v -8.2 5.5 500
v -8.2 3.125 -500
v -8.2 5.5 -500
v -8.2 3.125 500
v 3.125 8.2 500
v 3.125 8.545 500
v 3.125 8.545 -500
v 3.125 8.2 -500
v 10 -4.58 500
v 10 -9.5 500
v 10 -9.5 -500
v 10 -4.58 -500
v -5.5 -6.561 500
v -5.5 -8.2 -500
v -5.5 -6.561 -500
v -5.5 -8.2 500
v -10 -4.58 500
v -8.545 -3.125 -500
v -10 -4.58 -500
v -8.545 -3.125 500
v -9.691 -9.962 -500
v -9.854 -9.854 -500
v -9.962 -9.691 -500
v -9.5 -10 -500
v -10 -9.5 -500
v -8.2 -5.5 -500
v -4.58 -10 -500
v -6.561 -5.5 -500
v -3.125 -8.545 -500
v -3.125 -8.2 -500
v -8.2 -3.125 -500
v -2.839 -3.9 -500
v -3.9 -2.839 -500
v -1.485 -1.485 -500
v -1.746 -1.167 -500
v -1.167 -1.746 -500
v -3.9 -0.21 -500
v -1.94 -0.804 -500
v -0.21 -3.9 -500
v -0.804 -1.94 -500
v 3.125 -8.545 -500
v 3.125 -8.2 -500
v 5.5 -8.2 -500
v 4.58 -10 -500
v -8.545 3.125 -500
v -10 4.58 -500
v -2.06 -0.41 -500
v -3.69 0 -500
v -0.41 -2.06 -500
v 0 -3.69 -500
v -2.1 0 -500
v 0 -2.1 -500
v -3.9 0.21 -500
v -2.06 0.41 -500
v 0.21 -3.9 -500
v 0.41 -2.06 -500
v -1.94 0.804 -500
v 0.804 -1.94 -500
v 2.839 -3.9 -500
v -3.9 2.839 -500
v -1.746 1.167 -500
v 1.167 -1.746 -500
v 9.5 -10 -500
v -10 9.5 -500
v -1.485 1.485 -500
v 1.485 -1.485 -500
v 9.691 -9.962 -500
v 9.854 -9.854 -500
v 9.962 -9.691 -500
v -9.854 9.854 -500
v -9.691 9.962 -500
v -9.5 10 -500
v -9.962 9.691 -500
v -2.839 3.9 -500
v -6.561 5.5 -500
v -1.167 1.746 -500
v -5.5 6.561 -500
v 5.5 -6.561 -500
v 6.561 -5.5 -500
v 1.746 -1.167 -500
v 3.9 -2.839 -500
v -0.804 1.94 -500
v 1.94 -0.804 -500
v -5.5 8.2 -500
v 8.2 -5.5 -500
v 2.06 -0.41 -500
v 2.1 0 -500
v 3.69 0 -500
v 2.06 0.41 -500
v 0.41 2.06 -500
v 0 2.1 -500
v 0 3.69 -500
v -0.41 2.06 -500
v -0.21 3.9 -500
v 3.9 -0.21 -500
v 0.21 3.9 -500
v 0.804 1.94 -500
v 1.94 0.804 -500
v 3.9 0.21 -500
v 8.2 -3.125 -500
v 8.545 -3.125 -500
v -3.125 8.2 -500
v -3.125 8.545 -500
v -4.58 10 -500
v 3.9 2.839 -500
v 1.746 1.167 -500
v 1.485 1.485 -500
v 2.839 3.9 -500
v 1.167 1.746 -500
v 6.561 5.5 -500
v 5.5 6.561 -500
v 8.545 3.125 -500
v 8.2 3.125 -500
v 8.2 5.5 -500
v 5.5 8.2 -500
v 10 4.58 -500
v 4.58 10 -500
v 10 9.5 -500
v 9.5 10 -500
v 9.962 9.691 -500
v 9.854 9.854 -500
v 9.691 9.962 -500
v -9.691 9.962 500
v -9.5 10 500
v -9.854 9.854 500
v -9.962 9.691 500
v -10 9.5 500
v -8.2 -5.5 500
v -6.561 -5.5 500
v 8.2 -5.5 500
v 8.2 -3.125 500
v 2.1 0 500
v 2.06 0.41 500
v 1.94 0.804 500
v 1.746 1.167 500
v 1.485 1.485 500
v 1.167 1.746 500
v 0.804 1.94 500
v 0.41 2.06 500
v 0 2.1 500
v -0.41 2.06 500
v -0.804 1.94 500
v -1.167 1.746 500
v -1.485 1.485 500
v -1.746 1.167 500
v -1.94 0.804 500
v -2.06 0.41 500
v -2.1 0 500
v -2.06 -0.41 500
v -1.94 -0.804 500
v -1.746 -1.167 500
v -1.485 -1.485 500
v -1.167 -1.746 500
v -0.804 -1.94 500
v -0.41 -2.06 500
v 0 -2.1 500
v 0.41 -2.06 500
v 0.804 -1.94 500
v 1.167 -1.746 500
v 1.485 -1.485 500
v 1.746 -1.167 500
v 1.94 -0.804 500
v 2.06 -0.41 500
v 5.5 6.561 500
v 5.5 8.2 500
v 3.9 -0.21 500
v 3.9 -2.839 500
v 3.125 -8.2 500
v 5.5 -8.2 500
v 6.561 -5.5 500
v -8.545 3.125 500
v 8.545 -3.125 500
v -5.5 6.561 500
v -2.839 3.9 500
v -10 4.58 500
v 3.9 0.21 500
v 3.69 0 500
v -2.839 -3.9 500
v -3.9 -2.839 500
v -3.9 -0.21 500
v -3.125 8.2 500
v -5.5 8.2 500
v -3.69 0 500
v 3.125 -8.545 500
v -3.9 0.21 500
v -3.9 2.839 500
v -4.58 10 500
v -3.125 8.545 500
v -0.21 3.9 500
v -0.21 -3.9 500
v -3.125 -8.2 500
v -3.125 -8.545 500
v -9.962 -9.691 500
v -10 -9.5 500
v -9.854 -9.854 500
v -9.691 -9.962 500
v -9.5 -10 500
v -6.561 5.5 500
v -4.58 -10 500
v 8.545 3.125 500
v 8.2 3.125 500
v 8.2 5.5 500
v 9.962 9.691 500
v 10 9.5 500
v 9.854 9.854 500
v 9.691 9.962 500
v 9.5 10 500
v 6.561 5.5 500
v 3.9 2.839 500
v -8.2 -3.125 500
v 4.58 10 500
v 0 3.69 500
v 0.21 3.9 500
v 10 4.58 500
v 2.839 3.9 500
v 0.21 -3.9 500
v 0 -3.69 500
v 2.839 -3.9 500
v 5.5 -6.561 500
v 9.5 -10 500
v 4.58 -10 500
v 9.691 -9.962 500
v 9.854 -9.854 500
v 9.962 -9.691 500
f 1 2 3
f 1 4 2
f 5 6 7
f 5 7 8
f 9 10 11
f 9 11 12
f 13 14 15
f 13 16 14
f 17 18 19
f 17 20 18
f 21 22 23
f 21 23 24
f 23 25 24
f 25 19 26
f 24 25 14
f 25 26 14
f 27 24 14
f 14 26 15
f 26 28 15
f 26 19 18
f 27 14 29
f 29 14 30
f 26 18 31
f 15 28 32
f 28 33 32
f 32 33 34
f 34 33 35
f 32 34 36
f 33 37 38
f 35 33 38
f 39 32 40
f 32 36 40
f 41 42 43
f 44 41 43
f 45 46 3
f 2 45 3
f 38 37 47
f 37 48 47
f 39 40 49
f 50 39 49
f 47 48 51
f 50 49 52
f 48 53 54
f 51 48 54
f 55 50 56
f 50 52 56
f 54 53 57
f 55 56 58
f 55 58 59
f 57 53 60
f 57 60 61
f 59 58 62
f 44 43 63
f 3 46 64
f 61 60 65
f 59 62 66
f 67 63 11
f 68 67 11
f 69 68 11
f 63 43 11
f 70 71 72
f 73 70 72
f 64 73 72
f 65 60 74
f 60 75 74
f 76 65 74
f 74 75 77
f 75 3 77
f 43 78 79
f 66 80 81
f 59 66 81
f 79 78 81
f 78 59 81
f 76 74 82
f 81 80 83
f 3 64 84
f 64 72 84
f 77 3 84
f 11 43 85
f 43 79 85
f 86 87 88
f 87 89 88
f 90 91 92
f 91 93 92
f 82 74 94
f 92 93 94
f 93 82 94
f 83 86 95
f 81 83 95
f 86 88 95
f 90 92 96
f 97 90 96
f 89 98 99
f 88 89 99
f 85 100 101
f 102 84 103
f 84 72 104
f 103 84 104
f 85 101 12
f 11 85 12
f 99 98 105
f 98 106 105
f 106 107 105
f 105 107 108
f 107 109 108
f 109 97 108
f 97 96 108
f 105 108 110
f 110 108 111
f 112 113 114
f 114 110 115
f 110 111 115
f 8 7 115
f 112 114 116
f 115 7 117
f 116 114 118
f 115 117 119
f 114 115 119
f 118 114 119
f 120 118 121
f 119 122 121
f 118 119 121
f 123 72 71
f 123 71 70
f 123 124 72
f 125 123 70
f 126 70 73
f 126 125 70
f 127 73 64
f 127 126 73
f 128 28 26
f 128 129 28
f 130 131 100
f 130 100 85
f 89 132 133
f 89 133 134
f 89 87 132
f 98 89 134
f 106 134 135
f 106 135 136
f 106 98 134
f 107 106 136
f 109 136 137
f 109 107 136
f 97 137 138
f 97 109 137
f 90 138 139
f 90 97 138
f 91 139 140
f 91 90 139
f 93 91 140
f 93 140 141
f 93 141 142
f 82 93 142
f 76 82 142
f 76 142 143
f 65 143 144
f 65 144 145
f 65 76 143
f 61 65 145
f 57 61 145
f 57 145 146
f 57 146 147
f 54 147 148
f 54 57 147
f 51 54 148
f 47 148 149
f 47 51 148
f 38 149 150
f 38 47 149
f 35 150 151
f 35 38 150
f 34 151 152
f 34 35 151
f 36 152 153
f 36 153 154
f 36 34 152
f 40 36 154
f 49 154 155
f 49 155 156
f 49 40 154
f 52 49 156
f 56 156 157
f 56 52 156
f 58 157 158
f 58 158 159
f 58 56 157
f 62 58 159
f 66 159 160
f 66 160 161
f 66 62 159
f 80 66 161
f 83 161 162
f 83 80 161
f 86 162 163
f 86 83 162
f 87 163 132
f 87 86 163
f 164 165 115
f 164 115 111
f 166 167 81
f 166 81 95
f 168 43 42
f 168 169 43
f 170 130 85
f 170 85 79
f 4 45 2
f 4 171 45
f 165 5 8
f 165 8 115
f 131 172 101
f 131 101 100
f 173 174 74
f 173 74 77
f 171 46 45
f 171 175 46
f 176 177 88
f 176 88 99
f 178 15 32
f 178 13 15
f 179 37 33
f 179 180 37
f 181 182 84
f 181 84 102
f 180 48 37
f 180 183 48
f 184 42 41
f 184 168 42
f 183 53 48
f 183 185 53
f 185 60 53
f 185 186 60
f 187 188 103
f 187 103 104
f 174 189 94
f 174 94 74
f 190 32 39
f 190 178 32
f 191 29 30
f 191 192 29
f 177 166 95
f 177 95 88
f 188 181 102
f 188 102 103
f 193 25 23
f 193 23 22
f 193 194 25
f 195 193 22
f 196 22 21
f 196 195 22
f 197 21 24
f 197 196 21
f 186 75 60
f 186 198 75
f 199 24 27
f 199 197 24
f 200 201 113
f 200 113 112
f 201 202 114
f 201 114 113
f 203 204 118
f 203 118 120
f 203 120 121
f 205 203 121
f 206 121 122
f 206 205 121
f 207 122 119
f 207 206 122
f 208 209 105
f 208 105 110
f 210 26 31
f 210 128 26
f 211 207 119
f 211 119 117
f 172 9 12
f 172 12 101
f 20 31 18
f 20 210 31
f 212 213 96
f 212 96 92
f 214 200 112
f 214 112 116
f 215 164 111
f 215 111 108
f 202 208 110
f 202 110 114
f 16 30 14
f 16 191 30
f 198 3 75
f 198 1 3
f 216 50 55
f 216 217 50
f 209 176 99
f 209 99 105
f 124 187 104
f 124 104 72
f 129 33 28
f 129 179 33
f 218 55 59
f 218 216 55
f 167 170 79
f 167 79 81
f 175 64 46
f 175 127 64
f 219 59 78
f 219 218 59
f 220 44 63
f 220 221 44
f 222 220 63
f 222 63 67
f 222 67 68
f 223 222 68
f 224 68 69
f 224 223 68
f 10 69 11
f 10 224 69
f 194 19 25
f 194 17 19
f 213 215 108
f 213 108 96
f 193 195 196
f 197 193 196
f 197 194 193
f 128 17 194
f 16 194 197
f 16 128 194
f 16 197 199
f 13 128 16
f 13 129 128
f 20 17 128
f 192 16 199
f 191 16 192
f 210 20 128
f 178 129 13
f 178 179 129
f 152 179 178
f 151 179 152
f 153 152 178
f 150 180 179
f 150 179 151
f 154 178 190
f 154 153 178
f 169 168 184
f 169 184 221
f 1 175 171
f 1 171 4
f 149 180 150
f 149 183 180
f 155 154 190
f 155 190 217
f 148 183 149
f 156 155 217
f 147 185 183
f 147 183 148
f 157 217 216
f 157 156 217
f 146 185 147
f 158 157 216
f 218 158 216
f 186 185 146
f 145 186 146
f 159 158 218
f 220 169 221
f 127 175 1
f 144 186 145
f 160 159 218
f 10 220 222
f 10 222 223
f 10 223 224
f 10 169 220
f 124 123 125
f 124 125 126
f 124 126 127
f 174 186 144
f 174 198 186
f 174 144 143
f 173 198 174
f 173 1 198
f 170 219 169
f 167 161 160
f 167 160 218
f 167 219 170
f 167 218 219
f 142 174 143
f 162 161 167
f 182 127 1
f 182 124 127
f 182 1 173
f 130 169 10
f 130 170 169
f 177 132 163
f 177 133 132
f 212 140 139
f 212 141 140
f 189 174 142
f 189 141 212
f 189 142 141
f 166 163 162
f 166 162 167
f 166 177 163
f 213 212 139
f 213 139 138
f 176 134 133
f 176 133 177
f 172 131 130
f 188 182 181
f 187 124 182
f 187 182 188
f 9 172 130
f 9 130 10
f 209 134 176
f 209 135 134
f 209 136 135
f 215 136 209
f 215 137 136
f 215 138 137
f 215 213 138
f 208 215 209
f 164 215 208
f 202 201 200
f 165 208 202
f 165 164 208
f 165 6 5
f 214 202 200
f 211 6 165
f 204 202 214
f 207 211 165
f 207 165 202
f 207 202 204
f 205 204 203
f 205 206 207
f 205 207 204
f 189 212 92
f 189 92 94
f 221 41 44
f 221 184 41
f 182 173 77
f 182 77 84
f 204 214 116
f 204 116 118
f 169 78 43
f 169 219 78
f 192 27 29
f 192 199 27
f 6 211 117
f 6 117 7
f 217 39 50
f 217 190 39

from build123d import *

# Parameters (mm, degrees)
SKETCH1_R           = 2.1
BOSS_EXTRUDE1_DEPTH = 500


with BuildPart() as part:
    # Sketch1 → Boss-Extrude1 (new body, symmetric)
    with BuildSketch(Plane.XY):
        with BuildLine():
            Line((4.58, -10), (9.5, -10))
            ThreePointArc((9.5, -10), (9.853553391, -9.853553391), (10, -9.5))
            Line((10, -9.5), (10, -4.58))
            Line((10, -4.58), (8.545, -3.125))
            Line((8.545, -3.125), (8.2, -3.125))
            Line((8.2, -3.125), (8.2, -5.5))
            Line((8.2, -5.5), (6.560660172, -5.5))
            Line((6.560660172, -5.5), (3.9, -2.839339828))
            Line((3.9, -2.839339828), (3.9, -0.21))
            Line((3.9, -0.21), (3.69, 0))
            Line((3.69, 0), (3.9, 0.21))
            Line((3.9, 0.21), (3.9, 2.839339828))
            Line((3.9, 2.839339828), (6.560660172, 5.5))
            Line((6.560660172, 5.5), (8.2, 5.5))
            Line((8.2, 5.5), (8.2, 3.125))
            Line((8.2, 3.125), (8.545, 3.125))
            Line((8.545, 3.125), (10, 4.58))
            Line((10, 4.58), (10, 9.5))
            ThreePointArc((10, 9.5), (9.853553391, 9.853553391), (9.5, 10))
            Line((9.5, 10), (4.58, 10))
            Line((4.58, 10), (3.125, 8.545))
            Line((3.125, 8.545), (3.125, 8.2))
            Line((3.125, 8.2), (5.5, 8.2))
            Line((5.5, 8.2), (5.5, 6.560660172))
            Line((5.5, 6.560660172), (2.839339828, 3.9))
            Line((2.839339828, 3.9), (0.21, 3.9))
            Line((0.21, 3.9), (0, 3.69))
            Line((0, 3.69), (-0.21, 3.9))
            Line((-0.21, 3.9), (-2.839339828, 3.9))
            Line((-2.839339828, 3.9), (-5.5, 6.560660172))
            Line((-5.5, 6.560660172), (-5.5, 8.2))
            Line((-5.5, 8.2), (-3.125, 8.2))
            Line((-3.125, 8.2), (-3.125, 8.545))
            Line((-3.125, 8.545), (-4.58, 10))
            Line((-4.58, 10), (-9.5, 10))
            ThreePointArc((-9.5, 10), (-9.853553391, 9.853553391), (-10, 9.5))
            Line((-10, 9.5), (-10, 4.58))
            Line((-10, 4.58), (-8.545, 3.125))
            Line((-8.545, 3.125), (-8.2, 3.125))
            Line((-8.2, 3.125), (-8.2, 5.5))
            Line((-8.2, 5.5), (-6.560660172, 5.5))
            Line((-6.560660172, 5.5), (-3.9, 2.839339828))
            Line((-3.9, 2.839339828), (-3.9, 0.21))
            Line((-3.9, 0.21), (-3.69, 0))
            Line((-3.69, 0), (-3.9, -0.21))
            Line((-3.9, -0.21), (-3.9, -2.839339828))
            Line((-3.9, -2.839339828), (-6.560660172, -5.5))
            Line((-6.560660172, -5.5), (-8.2, -5.5))
            Line((-8.2, -5.5), (-8.2, -3.125))
            Line((-8.2, -3.125), (-8.545, -3.125))
            Line((-8.545, -3.125), (-10, -4.58))
            Line((-10, -4.58), (-10, -9.5))
            ThreePointArc((-10, -9.5), (-9.853553391, -9.853553391), (-9.5, -10))
            Line((-9.5, -10), (-4.58, -10))
            Line((-4.58, -10), (-3.125, -8.545))
            Line((-3.125, -8.545), (-3.125, -8.2))
            Line((-3.125, -8.2), (-5.5, -8.2))
            Line((-5.5, -8.2), (-5.5, -6.560660172))
            Line((-5.5, -6.560660172), (-2.839339828, -3.9))
            Line((-2.839339828, -3.9), (-0.21, -3.9))
            Line((-0.21, -3.9), (0, -3.69))
            Line((0, -3.69), (0.21, -3.9))
            Line((0.21, -3.9), (2.839339828, -3.9))
            Line((2.839339828, -3.9), (5.5, -6.560660172))
            Line((5.5, -6.560660172), (5.5, -8.2))
            Line((5.5, -8.2), (3.125, -8.2))
            Line((3.125, -8.2), (3.125, -8.545))
            Line((3.125, -8.545), (4.58, -10))
        make_face()
        Circle(SKETCH1_R, mode=Mode.SUBTRACT)
    extrude(amount=BOSS_EXTRUDE1_DEPTH, both=True)


solid = part.part
